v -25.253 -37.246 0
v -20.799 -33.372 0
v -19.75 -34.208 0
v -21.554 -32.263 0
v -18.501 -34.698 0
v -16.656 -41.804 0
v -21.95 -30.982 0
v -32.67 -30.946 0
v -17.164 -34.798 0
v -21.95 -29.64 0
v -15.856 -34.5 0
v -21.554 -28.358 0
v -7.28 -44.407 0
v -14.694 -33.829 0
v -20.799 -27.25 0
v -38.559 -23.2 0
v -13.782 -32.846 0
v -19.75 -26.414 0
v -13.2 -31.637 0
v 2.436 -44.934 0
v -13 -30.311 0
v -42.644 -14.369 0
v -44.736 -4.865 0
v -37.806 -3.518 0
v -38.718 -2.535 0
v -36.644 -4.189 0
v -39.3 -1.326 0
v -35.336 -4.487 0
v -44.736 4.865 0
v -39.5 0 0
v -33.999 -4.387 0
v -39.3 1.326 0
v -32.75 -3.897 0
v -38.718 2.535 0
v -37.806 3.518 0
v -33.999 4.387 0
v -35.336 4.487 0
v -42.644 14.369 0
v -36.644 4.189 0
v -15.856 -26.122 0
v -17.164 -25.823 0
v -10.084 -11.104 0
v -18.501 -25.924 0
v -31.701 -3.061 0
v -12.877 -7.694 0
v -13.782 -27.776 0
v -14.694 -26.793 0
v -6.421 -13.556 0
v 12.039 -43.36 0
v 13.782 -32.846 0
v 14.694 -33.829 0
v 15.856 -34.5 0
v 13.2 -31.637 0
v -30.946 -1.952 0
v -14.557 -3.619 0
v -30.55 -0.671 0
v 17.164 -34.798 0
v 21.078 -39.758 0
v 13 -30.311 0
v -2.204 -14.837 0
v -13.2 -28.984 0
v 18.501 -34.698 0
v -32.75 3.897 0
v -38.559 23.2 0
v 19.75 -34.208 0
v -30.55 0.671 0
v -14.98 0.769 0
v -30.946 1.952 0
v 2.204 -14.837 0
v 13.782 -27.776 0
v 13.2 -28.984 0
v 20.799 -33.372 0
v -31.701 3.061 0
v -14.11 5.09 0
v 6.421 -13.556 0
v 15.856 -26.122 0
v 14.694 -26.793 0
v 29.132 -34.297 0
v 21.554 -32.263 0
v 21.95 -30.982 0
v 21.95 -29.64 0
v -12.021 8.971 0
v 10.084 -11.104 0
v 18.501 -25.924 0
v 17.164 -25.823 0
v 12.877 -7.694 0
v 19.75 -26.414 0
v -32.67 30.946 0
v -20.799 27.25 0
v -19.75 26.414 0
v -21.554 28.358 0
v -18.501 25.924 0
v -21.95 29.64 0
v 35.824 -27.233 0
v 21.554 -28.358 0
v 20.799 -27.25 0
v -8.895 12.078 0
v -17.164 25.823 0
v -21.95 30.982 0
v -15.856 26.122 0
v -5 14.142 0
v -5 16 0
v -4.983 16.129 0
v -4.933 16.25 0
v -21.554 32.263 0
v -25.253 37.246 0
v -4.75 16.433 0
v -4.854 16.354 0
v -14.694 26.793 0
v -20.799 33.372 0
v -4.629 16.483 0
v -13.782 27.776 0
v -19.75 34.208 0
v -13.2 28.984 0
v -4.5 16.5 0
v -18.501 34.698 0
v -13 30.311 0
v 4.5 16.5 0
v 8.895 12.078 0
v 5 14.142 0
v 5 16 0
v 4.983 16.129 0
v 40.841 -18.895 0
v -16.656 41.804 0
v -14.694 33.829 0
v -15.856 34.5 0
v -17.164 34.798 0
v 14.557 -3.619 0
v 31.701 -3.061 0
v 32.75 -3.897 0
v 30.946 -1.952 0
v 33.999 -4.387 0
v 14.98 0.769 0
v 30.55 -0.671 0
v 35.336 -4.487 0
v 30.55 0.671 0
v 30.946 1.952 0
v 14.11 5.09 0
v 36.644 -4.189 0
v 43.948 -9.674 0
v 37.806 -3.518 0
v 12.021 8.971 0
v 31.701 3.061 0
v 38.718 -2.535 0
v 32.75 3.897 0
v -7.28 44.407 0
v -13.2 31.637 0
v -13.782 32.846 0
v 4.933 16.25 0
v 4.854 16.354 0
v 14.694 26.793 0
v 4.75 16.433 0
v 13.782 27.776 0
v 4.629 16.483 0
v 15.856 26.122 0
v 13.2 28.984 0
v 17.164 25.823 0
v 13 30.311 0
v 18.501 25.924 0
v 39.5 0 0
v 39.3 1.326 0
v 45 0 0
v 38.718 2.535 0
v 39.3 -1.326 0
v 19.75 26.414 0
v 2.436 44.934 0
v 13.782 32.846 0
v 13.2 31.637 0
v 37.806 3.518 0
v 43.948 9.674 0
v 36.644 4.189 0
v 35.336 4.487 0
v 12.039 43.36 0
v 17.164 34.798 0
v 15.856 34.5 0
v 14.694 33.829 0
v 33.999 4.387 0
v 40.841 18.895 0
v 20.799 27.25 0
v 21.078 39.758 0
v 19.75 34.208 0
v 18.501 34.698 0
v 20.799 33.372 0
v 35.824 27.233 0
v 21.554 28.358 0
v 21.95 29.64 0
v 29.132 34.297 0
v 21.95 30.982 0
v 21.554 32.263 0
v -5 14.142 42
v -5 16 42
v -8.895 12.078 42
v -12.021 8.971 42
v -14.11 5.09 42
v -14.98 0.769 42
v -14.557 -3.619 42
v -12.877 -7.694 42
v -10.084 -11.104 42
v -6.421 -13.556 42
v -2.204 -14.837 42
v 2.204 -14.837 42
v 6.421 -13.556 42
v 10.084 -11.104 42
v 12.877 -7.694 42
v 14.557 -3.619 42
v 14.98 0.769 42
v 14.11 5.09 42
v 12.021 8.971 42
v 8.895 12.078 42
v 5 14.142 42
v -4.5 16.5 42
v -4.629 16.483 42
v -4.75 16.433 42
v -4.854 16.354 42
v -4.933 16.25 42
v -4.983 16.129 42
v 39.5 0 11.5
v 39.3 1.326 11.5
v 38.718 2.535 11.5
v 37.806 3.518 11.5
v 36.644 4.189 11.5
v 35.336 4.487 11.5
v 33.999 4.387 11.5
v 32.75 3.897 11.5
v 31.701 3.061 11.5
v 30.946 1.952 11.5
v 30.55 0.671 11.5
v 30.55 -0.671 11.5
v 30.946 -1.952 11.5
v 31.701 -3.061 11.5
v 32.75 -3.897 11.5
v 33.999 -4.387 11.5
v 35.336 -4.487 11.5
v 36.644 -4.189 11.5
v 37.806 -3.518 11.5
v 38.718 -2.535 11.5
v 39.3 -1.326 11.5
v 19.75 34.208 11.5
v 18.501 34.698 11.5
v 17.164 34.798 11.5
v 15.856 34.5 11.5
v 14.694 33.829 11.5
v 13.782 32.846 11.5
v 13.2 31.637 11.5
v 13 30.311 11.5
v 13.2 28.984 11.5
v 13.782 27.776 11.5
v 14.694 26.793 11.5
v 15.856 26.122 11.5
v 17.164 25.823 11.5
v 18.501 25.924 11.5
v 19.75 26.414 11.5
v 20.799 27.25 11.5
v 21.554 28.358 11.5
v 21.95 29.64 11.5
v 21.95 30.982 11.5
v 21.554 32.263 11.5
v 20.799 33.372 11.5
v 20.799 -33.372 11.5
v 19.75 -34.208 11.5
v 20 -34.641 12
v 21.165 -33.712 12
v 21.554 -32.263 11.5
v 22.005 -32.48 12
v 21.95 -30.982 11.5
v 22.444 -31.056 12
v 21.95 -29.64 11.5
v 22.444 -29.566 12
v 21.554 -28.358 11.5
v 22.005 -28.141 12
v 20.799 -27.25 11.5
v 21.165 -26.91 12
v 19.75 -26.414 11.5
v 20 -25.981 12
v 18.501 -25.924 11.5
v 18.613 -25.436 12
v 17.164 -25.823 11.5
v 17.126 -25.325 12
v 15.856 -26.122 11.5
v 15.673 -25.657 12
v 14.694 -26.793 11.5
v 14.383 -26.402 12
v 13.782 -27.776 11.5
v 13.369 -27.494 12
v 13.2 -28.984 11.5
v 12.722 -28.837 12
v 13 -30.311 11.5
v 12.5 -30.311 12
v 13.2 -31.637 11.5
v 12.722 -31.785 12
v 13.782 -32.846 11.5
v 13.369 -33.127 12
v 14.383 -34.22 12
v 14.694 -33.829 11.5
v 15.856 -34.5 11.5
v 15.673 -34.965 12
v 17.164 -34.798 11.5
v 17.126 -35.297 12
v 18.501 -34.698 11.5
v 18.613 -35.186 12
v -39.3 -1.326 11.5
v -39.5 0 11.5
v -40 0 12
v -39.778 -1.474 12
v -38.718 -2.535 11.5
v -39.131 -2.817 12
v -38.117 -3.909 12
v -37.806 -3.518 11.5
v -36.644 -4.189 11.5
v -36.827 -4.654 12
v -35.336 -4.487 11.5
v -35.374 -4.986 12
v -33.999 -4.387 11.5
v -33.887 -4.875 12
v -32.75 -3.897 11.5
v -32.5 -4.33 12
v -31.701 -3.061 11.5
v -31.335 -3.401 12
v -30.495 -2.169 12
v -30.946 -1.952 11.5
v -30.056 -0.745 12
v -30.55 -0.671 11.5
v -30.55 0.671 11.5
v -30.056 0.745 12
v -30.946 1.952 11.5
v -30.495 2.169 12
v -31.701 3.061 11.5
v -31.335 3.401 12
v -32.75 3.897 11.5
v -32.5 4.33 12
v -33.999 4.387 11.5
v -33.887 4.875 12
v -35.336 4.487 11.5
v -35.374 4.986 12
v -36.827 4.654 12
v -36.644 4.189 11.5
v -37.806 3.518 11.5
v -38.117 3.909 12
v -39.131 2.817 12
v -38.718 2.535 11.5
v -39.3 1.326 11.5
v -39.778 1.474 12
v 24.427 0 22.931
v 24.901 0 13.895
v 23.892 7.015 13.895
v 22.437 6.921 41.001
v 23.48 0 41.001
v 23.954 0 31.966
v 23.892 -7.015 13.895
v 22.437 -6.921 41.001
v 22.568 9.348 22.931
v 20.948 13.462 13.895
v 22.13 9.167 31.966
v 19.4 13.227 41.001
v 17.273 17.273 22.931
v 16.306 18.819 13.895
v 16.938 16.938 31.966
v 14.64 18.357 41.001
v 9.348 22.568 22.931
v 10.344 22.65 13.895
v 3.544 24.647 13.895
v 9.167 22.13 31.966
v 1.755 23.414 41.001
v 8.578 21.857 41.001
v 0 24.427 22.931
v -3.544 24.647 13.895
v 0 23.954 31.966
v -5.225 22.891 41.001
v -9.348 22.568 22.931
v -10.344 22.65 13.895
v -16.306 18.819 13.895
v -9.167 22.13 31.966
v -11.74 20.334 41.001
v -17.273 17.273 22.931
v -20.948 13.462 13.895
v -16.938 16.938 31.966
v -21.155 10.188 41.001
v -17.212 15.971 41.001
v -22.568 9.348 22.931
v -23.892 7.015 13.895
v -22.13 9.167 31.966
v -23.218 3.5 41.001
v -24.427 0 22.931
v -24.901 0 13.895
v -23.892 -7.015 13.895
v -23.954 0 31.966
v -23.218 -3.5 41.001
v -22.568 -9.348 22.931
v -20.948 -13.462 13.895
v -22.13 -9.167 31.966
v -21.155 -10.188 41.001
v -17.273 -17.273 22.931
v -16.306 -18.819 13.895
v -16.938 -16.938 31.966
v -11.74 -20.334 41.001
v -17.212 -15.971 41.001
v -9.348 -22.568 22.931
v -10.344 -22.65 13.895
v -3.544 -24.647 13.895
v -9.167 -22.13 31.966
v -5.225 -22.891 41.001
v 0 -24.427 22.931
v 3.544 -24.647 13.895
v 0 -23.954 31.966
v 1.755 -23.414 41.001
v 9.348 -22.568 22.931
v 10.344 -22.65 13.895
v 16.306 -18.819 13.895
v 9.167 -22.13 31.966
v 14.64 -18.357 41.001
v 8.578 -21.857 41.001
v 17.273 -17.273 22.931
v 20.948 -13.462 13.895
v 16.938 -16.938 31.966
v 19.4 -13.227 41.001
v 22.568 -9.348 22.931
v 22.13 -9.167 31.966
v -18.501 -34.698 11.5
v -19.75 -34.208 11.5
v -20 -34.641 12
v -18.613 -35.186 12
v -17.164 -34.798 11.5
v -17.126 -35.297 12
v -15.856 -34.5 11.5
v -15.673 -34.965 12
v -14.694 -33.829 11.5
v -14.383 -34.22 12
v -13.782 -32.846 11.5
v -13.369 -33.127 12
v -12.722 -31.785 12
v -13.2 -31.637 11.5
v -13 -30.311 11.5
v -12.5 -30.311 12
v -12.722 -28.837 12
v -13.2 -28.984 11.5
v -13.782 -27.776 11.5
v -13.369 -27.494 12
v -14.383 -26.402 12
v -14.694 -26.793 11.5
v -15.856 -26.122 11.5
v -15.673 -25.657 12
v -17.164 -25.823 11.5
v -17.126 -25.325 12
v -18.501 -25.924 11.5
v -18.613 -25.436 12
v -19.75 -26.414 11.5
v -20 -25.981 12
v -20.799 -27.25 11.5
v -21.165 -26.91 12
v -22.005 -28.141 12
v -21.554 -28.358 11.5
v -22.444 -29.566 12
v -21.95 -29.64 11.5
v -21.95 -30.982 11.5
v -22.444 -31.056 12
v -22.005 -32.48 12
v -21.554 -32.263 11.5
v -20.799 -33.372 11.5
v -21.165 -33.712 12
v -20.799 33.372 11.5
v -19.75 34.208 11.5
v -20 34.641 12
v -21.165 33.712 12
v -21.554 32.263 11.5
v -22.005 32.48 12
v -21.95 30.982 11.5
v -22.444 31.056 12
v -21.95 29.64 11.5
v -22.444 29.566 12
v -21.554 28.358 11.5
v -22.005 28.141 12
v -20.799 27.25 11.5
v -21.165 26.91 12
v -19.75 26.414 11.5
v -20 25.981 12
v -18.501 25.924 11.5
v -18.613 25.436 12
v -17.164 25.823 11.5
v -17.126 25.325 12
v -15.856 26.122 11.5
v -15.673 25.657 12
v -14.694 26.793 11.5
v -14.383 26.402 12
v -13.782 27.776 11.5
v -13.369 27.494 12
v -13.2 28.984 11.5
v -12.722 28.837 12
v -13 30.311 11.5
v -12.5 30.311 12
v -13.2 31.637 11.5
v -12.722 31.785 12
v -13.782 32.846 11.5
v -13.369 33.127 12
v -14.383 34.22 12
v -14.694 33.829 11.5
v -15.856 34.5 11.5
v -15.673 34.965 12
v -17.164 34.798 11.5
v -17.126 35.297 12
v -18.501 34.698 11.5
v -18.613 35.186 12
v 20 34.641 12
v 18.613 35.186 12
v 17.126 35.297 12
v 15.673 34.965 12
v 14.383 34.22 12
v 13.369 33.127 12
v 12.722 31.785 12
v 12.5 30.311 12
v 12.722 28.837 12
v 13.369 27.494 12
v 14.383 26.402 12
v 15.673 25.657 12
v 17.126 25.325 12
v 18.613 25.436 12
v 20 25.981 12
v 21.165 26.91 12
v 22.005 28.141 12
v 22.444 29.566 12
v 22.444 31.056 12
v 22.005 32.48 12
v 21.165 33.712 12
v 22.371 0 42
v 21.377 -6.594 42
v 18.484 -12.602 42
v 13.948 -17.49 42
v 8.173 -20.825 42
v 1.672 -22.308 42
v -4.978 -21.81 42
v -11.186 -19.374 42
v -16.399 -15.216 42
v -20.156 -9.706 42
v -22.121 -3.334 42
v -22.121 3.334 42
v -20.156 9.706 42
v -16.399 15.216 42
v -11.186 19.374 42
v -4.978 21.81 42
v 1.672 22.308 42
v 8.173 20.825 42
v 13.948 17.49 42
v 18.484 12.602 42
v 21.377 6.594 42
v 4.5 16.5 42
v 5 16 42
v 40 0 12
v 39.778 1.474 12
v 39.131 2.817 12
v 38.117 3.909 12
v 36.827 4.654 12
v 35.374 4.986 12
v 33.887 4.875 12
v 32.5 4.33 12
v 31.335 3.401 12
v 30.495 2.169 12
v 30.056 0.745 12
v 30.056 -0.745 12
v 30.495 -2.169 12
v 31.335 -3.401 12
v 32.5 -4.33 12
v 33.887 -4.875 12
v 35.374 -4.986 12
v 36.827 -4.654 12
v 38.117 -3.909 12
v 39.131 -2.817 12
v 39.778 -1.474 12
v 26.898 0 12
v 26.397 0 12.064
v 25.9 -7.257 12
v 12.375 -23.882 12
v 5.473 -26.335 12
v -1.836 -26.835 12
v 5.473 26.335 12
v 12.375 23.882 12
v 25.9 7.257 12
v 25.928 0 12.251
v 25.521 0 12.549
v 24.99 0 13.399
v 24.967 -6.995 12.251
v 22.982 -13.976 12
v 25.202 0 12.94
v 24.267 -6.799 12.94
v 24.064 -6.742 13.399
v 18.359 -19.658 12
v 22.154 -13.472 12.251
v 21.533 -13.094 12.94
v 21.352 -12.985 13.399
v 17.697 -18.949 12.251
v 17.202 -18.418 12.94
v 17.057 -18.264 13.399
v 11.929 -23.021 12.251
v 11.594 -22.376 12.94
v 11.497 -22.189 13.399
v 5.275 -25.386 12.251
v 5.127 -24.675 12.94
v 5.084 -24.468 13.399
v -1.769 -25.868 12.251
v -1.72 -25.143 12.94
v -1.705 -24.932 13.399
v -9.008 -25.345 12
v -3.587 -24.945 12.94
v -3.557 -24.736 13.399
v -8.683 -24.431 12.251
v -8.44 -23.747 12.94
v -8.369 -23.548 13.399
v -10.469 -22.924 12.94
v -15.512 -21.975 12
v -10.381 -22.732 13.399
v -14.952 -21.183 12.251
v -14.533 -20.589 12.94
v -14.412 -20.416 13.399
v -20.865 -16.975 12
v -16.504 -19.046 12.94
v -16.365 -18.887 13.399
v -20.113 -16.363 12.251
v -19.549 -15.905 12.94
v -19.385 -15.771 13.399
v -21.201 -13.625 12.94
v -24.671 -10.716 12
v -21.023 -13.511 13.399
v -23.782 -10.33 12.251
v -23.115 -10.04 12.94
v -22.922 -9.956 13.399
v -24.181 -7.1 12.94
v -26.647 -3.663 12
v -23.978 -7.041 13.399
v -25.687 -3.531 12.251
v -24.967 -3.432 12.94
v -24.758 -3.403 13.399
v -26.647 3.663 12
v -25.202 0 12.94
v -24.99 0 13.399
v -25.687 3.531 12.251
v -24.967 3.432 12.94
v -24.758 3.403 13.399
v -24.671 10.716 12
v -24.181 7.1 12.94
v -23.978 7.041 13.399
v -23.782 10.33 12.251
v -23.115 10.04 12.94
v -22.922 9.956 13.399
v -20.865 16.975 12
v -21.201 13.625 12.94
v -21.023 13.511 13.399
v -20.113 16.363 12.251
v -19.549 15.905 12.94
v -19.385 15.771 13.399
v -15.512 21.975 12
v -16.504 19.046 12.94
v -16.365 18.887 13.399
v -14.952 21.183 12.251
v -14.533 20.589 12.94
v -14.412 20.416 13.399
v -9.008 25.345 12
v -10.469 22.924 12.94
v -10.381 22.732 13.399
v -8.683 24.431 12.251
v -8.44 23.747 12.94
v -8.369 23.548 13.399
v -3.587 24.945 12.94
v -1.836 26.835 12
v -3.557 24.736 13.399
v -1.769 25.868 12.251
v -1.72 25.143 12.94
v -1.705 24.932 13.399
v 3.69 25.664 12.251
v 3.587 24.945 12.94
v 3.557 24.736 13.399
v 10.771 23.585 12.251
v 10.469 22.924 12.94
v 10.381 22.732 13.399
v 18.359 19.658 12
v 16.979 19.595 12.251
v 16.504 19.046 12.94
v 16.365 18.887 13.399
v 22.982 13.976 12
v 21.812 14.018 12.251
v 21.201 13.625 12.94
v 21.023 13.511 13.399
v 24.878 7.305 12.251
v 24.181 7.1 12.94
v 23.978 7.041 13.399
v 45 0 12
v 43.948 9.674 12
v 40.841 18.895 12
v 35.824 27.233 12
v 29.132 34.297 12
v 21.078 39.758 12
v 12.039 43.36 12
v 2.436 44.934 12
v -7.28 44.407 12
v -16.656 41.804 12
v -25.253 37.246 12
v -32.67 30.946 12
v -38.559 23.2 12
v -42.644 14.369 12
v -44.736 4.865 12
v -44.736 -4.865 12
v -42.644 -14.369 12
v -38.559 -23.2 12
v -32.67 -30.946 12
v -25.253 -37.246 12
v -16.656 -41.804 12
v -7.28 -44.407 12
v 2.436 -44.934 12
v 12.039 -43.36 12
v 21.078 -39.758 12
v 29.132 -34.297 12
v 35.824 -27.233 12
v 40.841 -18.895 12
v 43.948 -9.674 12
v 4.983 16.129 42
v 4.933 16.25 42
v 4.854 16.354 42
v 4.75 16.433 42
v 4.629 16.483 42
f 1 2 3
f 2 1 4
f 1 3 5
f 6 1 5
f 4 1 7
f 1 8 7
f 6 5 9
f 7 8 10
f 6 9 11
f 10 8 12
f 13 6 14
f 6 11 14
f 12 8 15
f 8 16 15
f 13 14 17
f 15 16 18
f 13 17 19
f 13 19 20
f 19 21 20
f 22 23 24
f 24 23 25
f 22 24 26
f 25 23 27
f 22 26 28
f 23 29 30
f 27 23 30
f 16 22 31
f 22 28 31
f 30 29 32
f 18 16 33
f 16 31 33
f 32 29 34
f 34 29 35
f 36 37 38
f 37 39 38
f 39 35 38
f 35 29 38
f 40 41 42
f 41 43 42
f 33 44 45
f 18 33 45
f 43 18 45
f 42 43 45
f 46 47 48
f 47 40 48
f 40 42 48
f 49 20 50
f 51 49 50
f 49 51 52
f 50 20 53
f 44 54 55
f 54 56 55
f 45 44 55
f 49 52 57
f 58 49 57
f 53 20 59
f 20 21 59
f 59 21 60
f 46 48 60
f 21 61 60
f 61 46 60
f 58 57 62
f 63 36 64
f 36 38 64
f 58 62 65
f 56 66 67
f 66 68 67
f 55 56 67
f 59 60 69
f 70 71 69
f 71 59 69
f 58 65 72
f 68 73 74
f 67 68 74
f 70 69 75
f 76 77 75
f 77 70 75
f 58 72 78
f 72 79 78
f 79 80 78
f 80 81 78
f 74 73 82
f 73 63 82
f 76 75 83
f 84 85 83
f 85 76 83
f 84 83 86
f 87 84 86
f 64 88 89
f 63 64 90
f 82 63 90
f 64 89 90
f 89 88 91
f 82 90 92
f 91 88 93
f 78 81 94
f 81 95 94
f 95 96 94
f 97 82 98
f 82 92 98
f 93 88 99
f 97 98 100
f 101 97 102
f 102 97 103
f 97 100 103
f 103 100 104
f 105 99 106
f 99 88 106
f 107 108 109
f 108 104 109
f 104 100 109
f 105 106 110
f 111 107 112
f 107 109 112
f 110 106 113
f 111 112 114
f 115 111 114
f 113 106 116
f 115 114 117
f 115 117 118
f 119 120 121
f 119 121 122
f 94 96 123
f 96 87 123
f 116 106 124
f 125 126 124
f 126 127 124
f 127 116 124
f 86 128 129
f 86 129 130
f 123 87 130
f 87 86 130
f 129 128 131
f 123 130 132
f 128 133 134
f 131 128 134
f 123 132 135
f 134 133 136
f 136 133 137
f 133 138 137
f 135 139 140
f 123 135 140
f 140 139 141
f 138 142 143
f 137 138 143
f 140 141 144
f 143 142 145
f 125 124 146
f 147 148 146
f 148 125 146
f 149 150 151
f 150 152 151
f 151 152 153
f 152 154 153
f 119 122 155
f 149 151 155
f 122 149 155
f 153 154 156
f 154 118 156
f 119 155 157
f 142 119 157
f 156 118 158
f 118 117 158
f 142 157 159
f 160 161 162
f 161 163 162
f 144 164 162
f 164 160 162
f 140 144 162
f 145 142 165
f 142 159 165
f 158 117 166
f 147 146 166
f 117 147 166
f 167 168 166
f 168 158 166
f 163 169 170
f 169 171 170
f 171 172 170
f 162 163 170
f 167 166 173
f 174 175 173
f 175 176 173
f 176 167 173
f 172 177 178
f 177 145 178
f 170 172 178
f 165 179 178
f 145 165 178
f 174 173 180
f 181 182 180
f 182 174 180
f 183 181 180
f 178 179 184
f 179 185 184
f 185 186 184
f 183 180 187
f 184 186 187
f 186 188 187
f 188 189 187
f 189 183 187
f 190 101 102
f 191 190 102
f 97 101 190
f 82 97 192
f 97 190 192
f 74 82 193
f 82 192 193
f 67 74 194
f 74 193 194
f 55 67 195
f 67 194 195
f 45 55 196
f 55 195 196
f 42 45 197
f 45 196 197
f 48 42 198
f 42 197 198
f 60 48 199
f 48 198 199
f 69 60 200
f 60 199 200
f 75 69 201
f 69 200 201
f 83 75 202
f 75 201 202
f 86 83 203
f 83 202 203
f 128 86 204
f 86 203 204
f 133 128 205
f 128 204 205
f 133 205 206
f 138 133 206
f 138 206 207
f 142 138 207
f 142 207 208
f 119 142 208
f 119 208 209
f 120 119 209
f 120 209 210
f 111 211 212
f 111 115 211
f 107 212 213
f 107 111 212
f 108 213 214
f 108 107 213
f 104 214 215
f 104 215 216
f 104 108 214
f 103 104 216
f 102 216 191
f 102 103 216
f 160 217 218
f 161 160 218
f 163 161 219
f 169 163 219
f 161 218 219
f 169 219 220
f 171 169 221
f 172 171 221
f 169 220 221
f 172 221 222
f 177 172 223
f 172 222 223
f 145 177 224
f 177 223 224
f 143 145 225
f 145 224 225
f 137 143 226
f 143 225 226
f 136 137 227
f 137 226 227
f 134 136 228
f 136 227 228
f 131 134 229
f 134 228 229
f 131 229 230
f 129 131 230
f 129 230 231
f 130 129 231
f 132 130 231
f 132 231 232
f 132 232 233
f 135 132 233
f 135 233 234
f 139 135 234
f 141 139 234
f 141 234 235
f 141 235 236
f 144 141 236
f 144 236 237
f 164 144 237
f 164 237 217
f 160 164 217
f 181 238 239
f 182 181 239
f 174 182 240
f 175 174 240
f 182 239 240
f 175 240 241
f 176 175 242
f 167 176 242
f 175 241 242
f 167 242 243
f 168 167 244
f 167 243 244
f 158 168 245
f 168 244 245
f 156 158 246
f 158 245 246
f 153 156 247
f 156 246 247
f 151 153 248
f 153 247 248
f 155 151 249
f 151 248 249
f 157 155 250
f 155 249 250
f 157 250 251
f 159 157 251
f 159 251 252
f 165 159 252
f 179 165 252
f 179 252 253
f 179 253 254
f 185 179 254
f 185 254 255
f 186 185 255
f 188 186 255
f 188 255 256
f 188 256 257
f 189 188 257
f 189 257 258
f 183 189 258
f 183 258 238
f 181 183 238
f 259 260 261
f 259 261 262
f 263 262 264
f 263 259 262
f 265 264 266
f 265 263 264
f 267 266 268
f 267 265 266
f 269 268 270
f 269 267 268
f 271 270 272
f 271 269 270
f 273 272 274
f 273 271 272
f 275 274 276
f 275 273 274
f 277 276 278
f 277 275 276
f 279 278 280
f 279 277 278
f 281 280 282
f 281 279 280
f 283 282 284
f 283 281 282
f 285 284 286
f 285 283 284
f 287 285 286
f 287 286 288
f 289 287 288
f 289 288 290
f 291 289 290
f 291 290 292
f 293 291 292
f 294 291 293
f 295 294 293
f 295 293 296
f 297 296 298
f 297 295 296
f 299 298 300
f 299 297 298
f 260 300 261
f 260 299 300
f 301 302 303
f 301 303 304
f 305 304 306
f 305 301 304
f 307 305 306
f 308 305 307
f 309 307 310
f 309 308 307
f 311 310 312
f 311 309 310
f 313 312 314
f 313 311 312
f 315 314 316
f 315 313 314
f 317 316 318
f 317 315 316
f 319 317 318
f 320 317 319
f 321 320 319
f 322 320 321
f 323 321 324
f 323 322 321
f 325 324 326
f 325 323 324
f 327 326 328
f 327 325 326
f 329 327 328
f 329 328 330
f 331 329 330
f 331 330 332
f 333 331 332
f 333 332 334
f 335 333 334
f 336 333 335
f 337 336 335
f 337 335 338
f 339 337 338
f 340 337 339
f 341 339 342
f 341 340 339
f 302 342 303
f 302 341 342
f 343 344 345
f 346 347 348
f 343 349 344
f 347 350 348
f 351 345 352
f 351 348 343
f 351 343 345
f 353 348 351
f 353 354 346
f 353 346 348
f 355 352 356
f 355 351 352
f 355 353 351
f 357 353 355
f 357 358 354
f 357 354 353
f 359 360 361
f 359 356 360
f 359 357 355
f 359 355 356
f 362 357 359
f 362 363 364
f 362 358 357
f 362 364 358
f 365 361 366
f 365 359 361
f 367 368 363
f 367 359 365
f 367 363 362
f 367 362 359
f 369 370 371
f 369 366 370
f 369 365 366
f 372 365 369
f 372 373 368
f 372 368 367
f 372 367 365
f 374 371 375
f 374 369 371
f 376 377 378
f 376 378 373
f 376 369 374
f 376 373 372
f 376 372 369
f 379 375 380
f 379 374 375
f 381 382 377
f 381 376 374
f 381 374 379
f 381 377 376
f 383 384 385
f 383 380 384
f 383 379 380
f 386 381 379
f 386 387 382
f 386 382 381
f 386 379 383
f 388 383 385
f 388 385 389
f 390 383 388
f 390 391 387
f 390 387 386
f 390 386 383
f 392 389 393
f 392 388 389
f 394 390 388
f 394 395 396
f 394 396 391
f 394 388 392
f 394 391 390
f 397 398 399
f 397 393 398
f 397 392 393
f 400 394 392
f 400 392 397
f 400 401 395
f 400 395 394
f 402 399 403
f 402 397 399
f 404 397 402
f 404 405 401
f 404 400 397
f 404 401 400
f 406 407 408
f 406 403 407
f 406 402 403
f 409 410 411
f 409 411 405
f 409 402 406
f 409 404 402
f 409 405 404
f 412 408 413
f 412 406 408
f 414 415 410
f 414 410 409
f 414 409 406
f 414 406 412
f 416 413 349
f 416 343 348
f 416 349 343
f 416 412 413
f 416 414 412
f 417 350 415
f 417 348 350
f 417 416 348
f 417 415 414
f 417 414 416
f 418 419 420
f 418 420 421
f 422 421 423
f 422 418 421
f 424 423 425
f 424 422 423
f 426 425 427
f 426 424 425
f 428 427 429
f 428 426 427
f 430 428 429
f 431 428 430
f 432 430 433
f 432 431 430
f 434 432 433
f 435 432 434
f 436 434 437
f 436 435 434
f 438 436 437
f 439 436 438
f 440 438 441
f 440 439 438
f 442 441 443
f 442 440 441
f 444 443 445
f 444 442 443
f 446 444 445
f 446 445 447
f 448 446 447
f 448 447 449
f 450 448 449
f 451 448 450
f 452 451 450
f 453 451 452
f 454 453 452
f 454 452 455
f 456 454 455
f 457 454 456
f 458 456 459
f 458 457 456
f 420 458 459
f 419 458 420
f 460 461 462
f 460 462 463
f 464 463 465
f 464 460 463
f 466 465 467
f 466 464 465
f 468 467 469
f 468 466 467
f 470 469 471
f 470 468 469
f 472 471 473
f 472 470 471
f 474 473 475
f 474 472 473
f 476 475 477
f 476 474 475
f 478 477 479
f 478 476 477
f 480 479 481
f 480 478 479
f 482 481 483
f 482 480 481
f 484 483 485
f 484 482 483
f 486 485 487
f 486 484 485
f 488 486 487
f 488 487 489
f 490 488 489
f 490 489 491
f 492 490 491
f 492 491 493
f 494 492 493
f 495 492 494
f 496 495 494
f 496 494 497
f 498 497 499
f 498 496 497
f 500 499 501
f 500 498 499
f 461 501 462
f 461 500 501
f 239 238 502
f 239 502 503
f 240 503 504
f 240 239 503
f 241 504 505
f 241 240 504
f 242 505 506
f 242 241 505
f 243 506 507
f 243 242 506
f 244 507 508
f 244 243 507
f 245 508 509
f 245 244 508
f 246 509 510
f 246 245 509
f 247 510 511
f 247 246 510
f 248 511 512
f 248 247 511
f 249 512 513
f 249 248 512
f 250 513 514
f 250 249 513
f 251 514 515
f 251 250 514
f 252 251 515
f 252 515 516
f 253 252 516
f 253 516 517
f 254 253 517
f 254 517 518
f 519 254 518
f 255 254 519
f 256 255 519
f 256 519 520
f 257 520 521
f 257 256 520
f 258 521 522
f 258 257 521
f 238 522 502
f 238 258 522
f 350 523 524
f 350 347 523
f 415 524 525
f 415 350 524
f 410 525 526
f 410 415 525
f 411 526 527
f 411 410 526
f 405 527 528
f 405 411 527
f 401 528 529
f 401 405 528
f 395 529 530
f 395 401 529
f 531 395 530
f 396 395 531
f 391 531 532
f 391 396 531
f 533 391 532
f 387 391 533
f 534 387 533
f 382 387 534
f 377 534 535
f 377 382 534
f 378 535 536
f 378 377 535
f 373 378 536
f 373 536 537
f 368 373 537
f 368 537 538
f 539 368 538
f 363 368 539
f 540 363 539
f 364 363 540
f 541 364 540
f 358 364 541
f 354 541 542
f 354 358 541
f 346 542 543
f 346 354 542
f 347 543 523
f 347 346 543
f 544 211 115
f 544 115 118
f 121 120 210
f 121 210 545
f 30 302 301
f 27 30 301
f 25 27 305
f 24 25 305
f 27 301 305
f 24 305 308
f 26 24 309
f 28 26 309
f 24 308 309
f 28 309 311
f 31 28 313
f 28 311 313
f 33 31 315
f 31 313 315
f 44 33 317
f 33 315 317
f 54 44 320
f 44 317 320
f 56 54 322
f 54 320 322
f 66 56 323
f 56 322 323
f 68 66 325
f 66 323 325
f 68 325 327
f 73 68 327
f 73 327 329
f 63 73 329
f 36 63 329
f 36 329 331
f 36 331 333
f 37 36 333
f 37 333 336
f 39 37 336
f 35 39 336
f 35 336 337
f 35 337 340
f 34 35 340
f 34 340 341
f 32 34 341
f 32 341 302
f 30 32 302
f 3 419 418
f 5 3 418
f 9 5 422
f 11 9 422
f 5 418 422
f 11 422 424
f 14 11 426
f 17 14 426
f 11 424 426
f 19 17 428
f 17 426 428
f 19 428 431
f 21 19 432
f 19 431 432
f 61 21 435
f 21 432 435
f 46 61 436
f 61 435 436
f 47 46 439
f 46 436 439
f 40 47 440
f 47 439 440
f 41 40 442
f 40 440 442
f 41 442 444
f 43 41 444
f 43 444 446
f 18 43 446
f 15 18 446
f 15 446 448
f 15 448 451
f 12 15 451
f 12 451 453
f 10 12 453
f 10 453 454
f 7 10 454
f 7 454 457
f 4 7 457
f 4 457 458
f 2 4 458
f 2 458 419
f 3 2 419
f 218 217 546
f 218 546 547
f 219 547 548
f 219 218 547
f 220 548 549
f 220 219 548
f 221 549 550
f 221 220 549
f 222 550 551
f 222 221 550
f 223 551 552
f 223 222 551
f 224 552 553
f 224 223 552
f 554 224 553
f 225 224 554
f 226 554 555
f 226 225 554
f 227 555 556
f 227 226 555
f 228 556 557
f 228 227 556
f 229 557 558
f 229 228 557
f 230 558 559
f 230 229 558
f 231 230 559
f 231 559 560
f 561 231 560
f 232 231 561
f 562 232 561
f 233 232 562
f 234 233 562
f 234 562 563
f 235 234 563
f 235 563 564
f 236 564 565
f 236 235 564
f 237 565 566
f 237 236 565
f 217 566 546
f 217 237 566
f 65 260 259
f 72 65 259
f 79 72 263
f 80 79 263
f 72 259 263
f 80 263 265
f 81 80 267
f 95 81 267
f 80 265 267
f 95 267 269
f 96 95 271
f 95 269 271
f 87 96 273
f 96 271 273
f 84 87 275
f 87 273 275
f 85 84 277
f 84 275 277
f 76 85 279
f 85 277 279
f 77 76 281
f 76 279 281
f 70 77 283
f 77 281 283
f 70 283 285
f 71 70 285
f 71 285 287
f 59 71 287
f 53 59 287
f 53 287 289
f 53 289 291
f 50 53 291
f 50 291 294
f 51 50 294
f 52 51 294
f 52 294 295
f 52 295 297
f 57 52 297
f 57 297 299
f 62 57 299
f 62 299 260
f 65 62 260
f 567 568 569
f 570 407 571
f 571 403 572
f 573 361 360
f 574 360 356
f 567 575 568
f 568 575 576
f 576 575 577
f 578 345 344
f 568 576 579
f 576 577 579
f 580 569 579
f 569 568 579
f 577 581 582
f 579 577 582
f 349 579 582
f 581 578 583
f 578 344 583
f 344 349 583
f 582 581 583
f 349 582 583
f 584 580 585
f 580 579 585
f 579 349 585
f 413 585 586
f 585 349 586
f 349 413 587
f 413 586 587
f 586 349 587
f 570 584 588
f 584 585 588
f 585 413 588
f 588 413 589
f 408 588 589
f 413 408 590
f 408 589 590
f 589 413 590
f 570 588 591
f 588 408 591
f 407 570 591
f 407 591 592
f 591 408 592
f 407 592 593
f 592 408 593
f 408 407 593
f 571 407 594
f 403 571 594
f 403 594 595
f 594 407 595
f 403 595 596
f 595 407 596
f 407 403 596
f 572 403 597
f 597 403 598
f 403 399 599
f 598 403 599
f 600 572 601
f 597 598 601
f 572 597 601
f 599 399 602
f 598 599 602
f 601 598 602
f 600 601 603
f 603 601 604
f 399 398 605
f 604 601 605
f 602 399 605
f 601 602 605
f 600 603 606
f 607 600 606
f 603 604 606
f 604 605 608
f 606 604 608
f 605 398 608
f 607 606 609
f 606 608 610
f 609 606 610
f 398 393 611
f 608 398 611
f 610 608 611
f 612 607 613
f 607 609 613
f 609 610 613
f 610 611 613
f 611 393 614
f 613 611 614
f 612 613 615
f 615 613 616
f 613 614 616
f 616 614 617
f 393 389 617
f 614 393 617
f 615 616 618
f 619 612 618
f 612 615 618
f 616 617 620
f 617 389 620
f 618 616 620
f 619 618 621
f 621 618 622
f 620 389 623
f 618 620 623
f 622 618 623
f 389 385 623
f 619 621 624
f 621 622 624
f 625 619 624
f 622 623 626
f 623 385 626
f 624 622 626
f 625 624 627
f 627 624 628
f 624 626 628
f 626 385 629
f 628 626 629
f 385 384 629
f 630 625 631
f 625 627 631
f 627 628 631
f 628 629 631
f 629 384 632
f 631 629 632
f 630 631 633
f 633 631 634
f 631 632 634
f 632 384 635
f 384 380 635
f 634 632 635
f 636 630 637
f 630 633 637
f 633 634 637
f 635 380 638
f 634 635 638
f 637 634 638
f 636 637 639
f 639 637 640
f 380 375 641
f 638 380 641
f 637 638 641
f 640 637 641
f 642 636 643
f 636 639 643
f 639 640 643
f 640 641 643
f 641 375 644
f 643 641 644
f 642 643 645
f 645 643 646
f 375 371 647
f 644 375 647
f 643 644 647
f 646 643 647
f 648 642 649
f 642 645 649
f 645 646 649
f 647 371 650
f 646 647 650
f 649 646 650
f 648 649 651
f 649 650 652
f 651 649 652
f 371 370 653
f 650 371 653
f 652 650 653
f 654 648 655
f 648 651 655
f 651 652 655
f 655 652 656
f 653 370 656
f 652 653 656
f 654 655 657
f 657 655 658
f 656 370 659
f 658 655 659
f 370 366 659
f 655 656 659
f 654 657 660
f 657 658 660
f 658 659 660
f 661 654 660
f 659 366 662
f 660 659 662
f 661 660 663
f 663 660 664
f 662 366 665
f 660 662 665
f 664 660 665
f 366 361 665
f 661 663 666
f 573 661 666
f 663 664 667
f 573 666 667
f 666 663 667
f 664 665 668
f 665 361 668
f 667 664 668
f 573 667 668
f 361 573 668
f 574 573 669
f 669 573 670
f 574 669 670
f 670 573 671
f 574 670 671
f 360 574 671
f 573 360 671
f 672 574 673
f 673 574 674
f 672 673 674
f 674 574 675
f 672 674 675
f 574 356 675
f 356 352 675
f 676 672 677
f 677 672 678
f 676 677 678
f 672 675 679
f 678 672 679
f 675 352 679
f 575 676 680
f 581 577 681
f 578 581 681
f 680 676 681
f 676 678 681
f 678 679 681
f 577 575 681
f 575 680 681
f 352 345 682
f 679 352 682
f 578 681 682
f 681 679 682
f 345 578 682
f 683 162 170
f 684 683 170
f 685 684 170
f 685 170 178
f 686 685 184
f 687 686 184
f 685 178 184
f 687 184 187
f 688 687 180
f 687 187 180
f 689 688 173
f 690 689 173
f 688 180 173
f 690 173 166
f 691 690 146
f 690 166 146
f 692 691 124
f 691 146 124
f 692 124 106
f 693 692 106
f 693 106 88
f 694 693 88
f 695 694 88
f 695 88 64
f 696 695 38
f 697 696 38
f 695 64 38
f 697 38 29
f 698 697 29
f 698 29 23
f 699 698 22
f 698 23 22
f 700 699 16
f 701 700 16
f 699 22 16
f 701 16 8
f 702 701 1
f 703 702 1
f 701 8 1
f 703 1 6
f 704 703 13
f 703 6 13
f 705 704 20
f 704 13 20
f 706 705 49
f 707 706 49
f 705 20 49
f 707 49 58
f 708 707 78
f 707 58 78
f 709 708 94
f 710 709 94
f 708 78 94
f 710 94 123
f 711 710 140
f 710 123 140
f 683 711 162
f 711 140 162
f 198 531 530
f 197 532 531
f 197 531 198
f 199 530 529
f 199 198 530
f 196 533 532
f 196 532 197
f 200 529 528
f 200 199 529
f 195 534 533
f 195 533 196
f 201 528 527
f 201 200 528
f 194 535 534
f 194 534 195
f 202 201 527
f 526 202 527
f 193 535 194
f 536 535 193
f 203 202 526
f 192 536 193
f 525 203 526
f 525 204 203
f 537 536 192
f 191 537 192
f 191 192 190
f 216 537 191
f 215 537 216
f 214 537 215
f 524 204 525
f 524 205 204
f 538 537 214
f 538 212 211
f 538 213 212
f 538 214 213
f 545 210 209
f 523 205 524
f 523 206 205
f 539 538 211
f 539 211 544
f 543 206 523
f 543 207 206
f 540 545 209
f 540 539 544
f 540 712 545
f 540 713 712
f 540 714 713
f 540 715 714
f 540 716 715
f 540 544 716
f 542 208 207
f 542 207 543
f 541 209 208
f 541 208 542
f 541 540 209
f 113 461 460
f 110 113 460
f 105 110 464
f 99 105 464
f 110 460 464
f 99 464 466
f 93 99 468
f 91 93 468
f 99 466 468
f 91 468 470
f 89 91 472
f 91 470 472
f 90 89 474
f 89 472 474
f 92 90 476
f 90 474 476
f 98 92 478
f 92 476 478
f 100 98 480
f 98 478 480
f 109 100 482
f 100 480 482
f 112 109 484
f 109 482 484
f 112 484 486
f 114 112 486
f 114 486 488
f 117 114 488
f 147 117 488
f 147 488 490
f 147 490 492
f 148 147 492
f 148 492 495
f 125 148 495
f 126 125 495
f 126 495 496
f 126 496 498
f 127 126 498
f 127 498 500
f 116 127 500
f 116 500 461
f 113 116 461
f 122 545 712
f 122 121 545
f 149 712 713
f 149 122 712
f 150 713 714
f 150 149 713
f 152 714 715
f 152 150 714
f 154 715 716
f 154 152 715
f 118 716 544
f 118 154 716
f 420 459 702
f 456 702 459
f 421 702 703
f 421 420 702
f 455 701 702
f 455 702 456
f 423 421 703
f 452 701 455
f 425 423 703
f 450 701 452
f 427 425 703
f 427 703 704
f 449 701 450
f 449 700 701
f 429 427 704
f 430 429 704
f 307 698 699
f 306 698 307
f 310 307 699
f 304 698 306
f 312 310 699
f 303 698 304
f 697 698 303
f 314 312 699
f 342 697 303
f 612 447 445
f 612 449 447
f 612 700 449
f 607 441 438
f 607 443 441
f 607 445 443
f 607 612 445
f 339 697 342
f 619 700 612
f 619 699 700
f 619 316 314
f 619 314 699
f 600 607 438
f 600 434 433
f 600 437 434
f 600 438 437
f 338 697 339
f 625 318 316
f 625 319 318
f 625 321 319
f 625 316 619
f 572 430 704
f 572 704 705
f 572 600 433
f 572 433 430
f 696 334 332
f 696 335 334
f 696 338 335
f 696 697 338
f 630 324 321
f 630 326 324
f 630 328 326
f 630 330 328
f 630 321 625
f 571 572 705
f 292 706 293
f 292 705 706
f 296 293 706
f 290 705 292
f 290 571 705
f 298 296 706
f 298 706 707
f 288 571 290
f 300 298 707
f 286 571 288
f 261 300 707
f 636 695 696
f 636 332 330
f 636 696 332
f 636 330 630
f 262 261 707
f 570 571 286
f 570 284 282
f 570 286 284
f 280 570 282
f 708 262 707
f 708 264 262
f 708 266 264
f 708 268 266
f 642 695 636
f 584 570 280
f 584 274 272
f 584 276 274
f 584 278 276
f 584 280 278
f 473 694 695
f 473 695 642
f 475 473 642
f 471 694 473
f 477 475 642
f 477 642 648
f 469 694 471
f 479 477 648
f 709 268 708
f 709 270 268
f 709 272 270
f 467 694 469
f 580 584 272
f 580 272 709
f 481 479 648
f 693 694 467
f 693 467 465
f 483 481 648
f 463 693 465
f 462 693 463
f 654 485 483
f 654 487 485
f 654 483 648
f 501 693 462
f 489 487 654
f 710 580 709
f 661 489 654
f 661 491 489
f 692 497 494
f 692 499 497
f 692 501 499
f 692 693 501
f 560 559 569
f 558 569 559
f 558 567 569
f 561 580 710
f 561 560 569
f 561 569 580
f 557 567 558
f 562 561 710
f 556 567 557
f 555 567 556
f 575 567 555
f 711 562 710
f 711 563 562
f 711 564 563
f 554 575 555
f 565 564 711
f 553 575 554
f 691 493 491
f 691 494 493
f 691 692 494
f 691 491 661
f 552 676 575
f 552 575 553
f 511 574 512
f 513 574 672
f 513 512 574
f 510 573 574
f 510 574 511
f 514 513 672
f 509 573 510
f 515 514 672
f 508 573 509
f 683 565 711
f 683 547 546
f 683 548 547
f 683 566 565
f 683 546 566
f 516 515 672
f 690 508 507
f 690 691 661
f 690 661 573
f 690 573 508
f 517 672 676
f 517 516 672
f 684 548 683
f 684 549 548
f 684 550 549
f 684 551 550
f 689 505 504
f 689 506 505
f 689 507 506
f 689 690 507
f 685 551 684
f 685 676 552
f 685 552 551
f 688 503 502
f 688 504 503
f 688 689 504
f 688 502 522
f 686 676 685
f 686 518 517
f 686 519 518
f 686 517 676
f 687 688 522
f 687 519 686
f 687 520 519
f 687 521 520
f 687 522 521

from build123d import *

# Parameters (mm, degrees)
SKICA1_R                      = 45
P_IDAT_VYSUNUT_M1_DEPTH       = 12
SKICA2_R                      = 25
P_IDAT_VYSUNUT_M2_DEPTH       = 30
P_IDAT_VYSUNUT_M2_TAPER       = 3
ODEBRAT_VYSUNUT_M1_REACH      = 78.25
SKICA3_R                      = 15
ODEBRAT_VYSUNUT_M2_REACH      = 78.25
SKICA4_W                      = 10
SKICA4_H                      = 3.370987204
ZAOBLIT1_R                    = 2
ODEBRAT_VYSUNUT_M3_REACH      = 72.356
SKICA5_R                      = 4.5
ZKOSEN_1_SIZE                 = 0.5
KRUHOV_POLE1_COUNT            = 6
ZKOSEN_1_OF_KRUHOV_POLE1_SIZE = 0.5
ZAOBLIT2_R                    = 0.5
ZKOSEN_2_SIZE                 = 1.056754503
ZKOSEN_2_SIZE_2               = 1


with BuildPart() as part:
    # Skica1 → Přidat vysunutím1 (new body)
    with BuildSketch(Plane.XY):
        Circle(SKICA1_R)
    extrude(amount=P_IDAT_VYSUNUT_M1_DEPTH)

    # Skica2 → Přidat vysunutím2 (add)
    with BuildSketch(Plane.XY.offset(12)):
        Circle(SKICA2_R)
    extrude(amount=P_IDAT_VYSUNUT_M2_DEPTH, taper=P_IDAT_VYSUNUT_M2_TAPER)

    # Skica3 → Odebrat vysunutím1 (cut, up to next)
    with BuildSketch(Plane.XY.offset(42), mode=Mode.PRIVATE) as odebrat_vysunut_m1_sk1:
        Circle(SKICA3_R)
    odebrat_vysunut_m1_tool1 = extrude(odebrat_vysunut_m1_sk1.sketch, amount=-ODEBRAT_VYSUNUT_M1_REACH, mode=Mode.PRIVATE) & part.part
    add(odebrat_vysunut_m1_tool1.solids().sort_by_distance((0, 0, 42))[0], mode=Mode.SUBTRACT)

    # Skica4 → Odebrat vysunutím2 (cut, up to next)
    with BuildSketch(Plane.XY.offset(42), mode=Mode.PRIVATE) as odebrat_vysunut_m2_sk1:
        with Locations((0, 14.814506398)):
            Rectangle(SKICA4_W, SKICA4_H)
    odebrat_vysunut_m2_tool1 = extrude(odebrat_vysunut_m2_sk1.sketch, amount=-ODEBRAT_VYSUNUT_M2_REACH, mode=Mode.PRIVATE) & part.part
    add(odebrat_vysunut_m2_tool1.solids().sort_by_distance((0, 14.814506, 42))[0], mode=Mode.SUBTRACT)

    # Zaoblit1
    zaoblit1_edges = [part.edges().sort_by_distance(p)[0] for p in [
        (-25, 0, 12),
    ]]
    fillet(zaoblit1_edges, radius=ZAOBLIT1_R)

    # Skica5 → Odebrat vysunutím3 (cut, up to next)
    with BuildSketch(Plane.XY.offset(12), mode=Mode.PRIVATE) as odebrat_vysunut_m3_sk1:
        with Locations((35, 0)):
            Circle(SKICA5_R)
    odebrat_vysunut_m3_tool1 = extrude(odebrat_vysunut_m3_sk1.sketch, amount=-ODEBRAT_VYSUNUT_M3_REACH, mode=Mode.PRIVATE) & part.part
    odebrat_vysunut_m3 = odebrat_vysunut_m3_tool1.solids().sort_by_distance((35, 0, 12))[0]
    add(odebrat_vysunut_m3, mode=Mode.SUBTRACT)

    # Zkosení1
    zkosen_1_edges = [part.edges().sort_by_distance(p)[0] for p in [
        (30.5, 0, 12),
    ]]
    chamfer(zkosen_1_edges, length=ZKOSEN_1_SIZE)

    # Kruhové pole1: Odebrat vysunutím3 ×6 about axis
    kruhov_pole1_axis = Axis((0, 0, 0), (0, 0, 1))
    for i in range(1, KRUHOV_POLE1_COUNT):
        add(odebrat_vysunut_m3.rotate(kruhov_pole1_axis, i * 360 / KRUHOV_POLE1_COUNT), mode=Mode.SUBTRACT)

    # Zkosení1 of Kruhové pole1
    zkosen_1_of_kruhov_pole1_edges = [part.edges().sort_by_distance(p)[0] for p in [
        (15.25, 26.413774815, 12),
        (-15.25, 26.413774815, 12),
        (-30.5, 0, 12),
        (-15.25, -26.413774815, 12),
        (15.25, -26.413774815, 12),
    ]]
    chamfer(zkosen_1_of_kruhov_pole1_edges, length=ZKOSEN_1_OF_KRUHOV_POLE1_SIZE)

    # Zaoblit2
    zaoblit2_edges = [part.edges().sort_by_distance(p)[0] for p in [
        (-5, 16.5, 21),
        (5, 16.5, 21),
    ]]
    fillet(zaoblit2_edges, radius=ZAOBLIT2_R)

    # Zkosení2
    # the kernel refuses this chamfer: 1.056754503, 1 mm, written as the material it takes off along each edge
    with BuildSketch(Plane(origin=(0, 0, 42), x_dir=(1, 0, 0), z_dir=(0, 1, 0))) as zkosen_2_piece_1:
        Polygon((23.427766622 - ZKOSEN_2_SIZE, 0), (23.427766622 + ZKOSEN_2_SIZE_2 * 0.0523359562429, ZKOSEN_2_SIZE_2 * 0.998629534755), (23.427766622, 0), align=None)
    revolve(axis=Axis((0, 0, 42), (0, 0, -1)), mode=Mode.SUBTRACT)


solid = part.part
